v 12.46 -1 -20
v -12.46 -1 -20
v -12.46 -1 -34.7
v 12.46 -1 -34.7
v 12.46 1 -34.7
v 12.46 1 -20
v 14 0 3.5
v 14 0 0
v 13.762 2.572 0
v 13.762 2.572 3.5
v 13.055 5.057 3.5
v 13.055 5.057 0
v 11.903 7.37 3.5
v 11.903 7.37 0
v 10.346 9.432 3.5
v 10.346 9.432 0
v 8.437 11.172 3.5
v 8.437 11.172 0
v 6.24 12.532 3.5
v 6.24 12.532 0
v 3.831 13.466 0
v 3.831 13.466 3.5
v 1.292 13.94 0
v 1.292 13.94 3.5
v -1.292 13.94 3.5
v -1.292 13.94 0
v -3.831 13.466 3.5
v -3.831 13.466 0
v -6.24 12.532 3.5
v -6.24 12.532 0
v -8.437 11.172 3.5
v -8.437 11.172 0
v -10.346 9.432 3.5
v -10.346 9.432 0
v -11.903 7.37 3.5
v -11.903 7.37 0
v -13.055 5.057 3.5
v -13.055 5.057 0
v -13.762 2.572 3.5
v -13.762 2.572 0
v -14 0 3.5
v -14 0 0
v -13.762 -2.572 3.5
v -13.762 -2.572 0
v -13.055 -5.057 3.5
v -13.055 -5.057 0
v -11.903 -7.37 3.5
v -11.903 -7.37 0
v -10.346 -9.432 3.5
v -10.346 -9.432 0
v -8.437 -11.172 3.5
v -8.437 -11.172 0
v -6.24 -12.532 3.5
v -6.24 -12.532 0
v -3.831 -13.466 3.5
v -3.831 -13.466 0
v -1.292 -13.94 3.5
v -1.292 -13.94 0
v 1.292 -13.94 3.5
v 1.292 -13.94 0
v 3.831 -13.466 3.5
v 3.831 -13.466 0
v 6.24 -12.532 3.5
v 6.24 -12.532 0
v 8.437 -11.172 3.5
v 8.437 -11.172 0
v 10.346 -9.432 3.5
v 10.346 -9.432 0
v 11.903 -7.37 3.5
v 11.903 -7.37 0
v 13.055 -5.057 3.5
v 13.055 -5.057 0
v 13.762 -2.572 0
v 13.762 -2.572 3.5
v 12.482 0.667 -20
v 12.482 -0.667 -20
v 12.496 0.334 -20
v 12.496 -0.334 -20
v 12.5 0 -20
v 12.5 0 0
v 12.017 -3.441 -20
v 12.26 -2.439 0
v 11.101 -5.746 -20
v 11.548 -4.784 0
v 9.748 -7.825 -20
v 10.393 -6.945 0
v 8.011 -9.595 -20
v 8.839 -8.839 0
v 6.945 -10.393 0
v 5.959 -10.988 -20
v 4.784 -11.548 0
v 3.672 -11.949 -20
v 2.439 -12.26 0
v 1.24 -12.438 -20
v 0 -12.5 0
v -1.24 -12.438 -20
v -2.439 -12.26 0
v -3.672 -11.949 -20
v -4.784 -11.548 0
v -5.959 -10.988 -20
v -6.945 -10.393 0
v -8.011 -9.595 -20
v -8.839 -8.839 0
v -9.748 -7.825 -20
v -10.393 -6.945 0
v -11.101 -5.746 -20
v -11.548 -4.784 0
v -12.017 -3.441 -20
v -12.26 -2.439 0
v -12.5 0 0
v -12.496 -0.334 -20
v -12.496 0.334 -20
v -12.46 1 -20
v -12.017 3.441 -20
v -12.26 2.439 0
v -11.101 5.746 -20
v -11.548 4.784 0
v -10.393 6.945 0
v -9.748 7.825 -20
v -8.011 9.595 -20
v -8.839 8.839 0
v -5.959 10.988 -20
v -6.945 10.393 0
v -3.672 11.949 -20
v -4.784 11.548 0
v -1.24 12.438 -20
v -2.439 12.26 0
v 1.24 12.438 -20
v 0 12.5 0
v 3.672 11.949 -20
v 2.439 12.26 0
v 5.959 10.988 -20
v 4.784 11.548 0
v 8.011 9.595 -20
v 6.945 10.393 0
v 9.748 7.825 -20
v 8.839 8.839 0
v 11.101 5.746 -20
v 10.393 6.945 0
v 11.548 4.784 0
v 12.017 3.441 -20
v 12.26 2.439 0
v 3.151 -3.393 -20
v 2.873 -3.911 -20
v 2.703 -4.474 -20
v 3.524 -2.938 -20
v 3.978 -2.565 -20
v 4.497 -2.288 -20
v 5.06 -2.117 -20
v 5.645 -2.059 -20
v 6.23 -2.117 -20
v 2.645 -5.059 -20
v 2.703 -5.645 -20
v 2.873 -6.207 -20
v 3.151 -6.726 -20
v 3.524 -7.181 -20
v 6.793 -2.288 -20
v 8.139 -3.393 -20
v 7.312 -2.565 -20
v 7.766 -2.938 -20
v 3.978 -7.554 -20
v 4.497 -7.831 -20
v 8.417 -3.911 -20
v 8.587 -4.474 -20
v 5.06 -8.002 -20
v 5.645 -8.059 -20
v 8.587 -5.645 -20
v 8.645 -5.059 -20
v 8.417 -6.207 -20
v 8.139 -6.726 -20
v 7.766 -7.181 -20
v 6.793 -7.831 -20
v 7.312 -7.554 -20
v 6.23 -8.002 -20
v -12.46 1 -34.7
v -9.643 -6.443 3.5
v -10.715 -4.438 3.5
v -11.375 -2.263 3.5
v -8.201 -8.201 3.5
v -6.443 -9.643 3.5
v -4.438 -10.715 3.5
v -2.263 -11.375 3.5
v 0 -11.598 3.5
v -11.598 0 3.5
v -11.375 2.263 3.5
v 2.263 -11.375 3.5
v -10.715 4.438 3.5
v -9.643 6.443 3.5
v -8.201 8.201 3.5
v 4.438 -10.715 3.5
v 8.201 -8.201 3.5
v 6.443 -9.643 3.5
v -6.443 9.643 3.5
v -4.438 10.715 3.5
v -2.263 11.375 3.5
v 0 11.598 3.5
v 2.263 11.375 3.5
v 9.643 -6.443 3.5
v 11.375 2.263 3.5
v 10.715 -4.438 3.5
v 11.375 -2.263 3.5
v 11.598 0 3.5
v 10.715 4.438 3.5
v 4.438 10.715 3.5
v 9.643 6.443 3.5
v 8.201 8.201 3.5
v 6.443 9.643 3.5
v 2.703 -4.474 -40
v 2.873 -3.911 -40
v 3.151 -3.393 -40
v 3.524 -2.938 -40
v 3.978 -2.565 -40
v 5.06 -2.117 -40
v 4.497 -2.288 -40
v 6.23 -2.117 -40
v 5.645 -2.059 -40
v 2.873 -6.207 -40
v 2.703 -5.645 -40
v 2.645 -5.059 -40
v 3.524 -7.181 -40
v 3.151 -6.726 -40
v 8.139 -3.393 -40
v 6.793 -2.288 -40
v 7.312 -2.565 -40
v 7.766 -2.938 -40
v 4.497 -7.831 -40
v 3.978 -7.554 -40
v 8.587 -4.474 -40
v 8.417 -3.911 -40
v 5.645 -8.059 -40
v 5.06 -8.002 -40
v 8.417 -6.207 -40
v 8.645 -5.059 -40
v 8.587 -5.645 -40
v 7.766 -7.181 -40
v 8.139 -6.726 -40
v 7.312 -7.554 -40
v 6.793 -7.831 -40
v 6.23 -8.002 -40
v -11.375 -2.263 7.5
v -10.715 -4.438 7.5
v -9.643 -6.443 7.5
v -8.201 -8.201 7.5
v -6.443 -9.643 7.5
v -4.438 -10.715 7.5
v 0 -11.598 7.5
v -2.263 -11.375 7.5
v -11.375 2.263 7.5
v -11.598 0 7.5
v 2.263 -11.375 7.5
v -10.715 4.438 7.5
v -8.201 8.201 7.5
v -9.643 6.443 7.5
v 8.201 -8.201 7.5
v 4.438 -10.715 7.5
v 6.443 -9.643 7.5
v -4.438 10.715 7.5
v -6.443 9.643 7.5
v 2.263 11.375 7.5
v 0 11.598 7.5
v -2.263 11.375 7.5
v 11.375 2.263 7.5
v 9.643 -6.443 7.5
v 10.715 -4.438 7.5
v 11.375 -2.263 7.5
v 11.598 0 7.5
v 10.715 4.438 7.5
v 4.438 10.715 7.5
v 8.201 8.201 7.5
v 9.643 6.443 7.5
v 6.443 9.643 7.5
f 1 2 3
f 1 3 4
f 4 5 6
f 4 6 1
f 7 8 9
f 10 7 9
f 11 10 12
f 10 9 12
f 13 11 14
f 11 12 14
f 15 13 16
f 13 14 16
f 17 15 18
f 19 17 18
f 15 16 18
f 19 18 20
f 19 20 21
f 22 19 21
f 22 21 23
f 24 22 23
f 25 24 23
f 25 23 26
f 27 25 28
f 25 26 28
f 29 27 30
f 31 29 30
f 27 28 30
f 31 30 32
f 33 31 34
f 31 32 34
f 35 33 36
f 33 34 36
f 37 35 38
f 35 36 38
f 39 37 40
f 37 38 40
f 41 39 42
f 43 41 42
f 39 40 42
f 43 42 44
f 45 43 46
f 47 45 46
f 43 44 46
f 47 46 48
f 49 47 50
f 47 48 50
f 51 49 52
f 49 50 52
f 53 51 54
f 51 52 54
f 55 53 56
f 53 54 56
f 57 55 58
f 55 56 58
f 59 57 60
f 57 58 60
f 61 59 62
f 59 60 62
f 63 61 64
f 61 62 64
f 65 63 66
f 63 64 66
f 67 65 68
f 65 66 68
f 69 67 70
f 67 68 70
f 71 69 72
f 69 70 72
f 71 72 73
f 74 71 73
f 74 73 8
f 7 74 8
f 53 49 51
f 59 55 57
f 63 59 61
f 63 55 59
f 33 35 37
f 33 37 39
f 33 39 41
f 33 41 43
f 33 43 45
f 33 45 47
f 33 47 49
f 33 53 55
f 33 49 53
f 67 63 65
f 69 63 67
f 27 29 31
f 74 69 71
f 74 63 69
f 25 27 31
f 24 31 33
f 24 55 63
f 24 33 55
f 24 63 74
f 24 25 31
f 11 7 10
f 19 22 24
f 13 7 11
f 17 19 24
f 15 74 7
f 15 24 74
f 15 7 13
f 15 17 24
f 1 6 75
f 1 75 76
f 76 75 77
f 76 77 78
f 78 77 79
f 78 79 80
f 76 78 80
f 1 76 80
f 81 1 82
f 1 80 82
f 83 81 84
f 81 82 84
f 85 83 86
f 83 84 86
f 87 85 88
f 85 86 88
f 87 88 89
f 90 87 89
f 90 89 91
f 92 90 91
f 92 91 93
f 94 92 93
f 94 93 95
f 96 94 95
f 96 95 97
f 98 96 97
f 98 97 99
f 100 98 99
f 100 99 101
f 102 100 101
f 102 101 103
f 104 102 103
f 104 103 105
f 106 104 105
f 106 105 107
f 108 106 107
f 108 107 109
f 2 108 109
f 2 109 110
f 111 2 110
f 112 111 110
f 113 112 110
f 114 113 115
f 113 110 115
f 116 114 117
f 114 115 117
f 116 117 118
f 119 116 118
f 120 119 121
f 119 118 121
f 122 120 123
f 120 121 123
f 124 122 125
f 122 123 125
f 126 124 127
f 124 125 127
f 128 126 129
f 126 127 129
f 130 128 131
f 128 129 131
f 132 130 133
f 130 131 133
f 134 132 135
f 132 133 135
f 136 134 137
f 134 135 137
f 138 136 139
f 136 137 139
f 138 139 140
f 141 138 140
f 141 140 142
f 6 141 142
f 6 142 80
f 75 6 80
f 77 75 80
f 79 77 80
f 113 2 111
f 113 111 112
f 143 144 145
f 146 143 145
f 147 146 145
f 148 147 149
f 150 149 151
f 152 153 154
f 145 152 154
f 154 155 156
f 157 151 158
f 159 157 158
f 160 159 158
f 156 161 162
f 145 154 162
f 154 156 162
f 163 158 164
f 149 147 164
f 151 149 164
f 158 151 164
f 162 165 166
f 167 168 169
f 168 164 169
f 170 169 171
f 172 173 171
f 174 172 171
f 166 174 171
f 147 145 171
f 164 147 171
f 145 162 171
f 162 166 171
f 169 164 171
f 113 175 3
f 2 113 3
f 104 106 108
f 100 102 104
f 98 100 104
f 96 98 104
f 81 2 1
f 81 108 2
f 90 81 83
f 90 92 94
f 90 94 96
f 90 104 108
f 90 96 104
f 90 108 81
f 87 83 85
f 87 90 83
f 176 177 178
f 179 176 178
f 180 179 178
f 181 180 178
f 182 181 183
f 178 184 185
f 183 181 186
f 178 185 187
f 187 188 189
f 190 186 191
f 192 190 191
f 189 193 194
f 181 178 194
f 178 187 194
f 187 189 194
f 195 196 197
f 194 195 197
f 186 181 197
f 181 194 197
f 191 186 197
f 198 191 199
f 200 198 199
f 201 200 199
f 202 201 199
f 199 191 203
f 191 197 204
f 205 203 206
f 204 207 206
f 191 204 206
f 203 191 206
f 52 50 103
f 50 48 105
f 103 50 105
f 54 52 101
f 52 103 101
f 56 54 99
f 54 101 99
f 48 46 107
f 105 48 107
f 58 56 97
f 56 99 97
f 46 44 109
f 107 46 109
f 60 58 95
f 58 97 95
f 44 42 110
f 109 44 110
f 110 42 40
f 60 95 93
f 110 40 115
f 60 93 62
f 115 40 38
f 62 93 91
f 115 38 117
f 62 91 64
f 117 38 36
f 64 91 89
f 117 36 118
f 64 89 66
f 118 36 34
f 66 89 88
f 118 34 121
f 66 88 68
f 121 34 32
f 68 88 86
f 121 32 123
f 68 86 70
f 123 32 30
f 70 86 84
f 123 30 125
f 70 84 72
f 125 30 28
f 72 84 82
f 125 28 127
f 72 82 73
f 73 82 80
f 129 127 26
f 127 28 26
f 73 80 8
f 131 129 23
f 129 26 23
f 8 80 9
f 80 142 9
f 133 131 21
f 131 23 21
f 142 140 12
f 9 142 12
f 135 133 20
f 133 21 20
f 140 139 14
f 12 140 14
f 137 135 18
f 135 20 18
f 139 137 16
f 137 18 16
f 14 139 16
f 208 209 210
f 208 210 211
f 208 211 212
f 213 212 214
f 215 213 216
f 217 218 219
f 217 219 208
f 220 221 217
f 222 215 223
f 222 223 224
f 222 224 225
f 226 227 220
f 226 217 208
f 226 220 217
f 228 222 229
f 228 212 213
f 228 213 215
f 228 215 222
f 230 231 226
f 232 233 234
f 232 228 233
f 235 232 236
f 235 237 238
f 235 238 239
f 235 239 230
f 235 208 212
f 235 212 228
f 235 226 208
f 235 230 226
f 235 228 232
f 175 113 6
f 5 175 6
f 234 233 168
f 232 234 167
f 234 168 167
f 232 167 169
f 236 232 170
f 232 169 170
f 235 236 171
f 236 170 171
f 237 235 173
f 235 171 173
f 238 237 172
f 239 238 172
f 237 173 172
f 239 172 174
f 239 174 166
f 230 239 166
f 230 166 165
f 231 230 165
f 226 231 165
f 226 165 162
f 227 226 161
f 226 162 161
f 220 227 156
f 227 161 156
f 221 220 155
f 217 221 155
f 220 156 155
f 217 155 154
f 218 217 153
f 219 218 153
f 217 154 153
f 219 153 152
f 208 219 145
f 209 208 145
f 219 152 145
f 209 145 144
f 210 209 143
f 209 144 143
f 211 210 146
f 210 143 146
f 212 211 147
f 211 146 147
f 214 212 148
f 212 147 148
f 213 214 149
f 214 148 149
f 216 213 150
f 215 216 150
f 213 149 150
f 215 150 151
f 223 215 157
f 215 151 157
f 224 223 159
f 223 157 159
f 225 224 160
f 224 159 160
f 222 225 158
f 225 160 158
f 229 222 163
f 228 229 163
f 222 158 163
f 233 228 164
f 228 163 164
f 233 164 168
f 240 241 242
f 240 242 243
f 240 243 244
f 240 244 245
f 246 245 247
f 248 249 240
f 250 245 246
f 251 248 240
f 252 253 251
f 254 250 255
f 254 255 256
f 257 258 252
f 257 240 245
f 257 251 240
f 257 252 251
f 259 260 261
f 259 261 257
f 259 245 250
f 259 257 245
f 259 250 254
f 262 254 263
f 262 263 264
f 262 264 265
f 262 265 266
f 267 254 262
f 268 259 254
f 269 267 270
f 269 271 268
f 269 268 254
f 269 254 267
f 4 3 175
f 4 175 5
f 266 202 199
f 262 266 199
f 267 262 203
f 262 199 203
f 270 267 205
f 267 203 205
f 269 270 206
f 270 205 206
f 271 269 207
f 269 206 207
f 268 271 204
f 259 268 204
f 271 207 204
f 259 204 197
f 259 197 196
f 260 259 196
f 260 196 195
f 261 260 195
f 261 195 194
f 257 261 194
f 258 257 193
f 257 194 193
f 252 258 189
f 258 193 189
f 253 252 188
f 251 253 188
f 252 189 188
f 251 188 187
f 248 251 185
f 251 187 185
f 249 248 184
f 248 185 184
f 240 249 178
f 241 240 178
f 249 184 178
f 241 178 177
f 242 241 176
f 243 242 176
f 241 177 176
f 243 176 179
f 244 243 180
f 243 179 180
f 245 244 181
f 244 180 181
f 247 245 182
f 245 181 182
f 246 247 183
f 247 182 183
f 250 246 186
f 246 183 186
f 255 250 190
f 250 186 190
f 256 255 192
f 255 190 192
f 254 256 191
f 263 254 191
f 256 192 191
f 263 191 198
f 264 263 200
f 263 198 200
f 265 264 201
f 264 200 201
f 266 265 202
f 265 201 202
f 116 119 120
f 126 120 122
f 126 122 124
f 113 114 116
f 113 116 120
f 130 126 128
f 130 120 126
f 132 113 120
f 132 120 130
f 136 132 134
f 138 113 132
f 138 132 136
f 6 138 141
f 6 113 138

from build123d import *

# Parameters (mm, degrees)
F0_R     = 14
F1_DEPTH = 3.5
F2_R     = 12.5
F3_DEPTH = 20
F4_W     = 24.919872
F4_H     = 2
F5_DEPTH = 14.7
F6_R     = 11.597849
F7_DEPTH = 4
F8_R     = 3
F9_DEPTH = 20


with BuildPart() as f1:
    # F0 (on Top) → F1 (new body)
    with BuildSketch(Plane.XY):
        Circle(F0_R)
    extrude(amount=F1_DEPTH)

    # F2 (on face) → F3 (join)
    with BuildSketch(Plane(origin=(0, 0, 0), x_dir=(1, 0, 0), z_dir=(0, 0, -1))):
        Circle(F2_R)
    extrude(amount=F3_DEPTH)

    # F4 (on face) → F5 (join)
    with BuildSketch(Plane(origin=(0, 0, -20), x_dir=(1, 0, 0), z_dir=(0, 0, -1))):
        Rectangle(F4_W, F4_H)
    extrude(amount=F5_DEPTH)


with BuildPart() as f7:
    # F6 (on face) → F7 (new body)
    with BuildSketch(Plane.XY.offset(3.5)):
        Circle(F6_R)
    extrude(amount=F7_DEPTH)


with BuildPart() as f9:
    # F8 (on face) → F9 (new body)
    with BuildSketch(Plane(origin=(0, 0, -20), x_dir=(1, 0, 0), z_dir=(0, 0, -1))):
        with Locations((5.644933, 5.059424)):
            Circle(F8_R)
    extrude(amount=F9_DEPTH)


solid = Compound([f1.part, f7.part, f9.part])
